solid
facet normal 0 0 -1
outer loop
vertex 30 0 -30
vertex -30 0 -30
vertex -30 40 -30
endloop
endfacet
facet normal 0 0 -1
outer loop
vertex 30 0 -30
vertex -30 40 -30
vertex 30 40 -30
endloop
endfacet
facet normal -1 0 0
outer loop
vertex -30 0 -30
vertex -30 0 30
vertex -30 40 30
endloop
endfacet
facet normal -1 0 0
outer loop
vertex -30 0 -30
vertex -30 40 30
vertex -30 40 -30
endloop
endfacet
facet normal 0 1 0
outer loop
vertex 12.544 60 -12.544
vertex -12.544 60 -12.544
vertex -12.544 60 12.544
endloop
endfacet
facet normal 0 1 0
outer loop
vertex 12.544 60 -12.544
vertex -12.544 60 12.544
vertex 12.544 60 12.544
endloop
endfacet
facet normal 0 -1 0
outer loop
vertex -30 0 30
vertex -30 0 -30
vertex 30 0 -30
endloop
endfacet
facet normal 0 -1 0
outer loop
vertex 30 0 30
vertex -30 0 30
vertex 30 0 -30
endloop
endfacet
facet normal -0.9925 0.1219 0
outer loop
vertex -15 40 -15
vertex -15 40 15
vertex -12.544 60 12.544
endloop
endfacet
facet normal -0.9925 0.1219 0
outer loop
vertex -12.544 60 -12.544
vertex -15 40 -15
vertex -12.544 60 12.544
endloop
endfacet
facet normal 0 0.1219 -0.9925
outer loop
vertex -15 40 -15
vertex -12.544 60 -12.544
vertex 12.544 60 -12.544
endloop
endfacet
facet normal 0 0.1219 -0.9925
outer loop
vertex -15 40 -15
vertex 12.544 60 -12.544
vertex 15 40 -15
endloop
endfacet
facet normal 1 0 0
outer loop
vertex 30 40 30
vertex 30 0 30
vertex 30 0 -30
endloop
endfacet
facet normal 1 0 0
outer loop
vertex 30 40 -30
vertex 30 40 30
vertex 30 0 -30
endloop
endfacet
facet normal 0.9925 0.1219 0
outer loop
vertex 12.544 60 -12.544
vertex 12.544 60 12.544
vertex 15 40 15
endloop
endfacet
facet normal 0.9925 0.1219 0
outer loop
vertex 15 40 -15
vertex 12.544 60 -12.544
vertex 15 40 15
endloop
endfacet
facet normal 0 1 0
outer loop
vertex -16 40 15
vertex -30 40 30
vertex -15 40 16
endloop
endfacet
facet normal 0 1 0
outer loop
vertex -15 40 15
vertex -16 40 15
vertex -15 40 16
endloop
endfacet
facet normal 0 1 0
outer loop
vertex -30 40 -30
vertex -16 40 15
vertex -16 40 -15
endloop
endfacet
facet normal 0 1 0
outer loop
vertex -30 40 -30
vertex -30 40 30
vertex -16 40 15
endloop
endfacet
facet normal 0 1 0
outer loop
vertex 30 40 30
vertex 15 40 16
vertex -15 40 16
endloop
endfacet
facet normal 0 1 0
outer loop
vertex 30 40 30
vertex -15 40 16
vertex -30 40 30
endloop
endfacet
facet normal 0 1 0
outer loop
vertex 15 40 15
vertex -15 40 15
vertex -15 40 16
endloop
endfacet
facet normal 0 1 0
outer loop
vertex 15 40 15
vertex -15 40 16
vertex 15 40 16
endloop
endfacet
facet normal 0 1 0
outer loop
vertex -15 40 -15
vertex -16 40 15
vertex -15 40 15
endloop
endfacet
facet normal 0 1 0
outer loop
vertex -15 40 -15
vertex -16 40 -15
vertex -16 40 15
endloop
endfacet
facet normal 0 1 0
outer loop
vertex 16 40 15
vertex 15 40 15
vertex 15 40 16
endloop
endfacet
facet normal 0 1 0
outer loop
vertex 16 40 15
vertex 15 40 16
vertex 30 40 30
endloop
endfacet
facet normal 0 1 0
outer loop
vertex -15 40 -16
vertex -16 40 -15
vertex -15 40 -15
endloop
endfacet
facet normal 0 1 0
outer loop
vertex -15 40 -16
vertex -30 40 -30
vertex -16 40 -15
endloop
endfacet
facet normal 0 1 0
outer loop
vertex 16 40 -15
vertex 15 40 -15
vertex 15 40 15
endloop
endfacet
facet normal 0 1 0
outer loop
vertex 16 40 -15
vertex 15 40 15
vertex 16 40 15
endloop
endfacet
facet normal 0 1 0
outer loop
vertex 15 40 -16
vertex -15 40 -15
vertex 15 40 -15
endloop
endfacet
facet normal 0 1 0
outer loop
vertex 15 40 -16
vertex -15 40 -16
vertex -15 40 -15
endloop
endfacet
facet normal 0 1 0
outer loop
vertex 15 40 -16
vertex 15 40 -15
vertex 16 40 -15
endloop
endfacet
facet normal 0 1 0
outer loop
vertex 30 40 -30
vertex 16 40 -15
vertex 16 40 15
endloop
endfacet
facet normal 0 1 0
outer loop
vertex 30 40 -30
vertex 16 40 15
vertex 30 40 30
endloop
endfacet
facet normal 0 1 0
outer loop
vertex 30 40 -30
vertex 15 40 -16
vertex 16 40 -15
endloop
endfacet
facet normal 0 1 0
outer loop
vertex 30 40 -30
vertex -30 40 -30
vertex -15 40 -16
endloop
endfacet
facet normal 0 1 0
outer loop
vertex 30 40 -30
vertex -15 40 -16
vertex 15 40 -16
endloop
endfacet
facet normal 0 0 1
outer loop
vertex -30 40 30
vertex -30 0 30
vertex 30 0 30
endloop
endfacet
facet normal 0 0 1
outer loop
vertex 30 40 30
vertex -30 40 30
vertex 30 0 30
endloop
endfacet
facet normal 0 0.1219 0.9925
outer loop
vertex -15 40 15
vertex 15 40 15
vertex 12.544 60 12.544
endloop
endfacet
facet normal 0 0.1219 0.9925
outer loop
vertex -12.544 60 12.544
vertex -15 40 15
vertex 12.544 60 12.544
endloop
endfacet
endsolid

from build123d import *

# Parameters (mm, degrees)
SKETCH1_W           = 60
SKETCH1_H           = 60
BOSS_EXTRUDE1_DEPTH = 40
SKETCH2_W           = 30
SKETCH2_H           = 30
BOSS_EXTRUDE2_DEPTH = 20
BOSS_EXTRUDE2_TAPER = 5
DRAFT1_START        = -16
DRAFT1_DEPTH        = 32
DRAFT1_2_DEPTH      = 32


with BuildPart() as part:
    # Sketch1 → Boss-Extrude1 (new body)
    with BuildSketch(Plane(origin=(0, 0, 0), x_dir=(1, 0, 0), z_dir=(0, 1, 0))):
        Rectangle(SKETCH1_W, SKETCH1_H)
    extrude(amount=BOSS_EXTRUDE1_DEPTH)

    # Sketch2 → Boss-Extrude2 (add)
    with BuildSketch(Plane(origin=(0, 40, 0), x_dir=(1, 0, 0), z_dir=(0, 1, 0))):
        Rectangle(SKETCH2_W, SKETCH2_H)
    extrude(amount=BOSS_EXTRUDE2_DEPTH, taper=BOSS_EXTRUDE2_TAPER)

    # Draft1: read off the stored shape, not the designer's step
    # Draft1 outline → Draft1 (cut)
    with BuildSketch(Plane.XY.offset(DRAFT1_START)):
        Polygon((-15, 40), (-12.544308782, 60), (-13.250226729, 60), align=None)
        Polygon((12.544308782, 60), (15, 40), (13.250226729, 60), align=None)
    extrude(amount=DRAFT1_DEPTH, mode=Mode.SUBTRACT)

    # Draft1 2 outline → Draft1 2 (cut)
    with BuildSketch(Plane.YZ.offset(DRAFT1_START)):
        Polygon((60, -12.544308782), (40, -15), (60, -13.250226729), align=None)
        Polygon((60, 13.250226729), (40, 15), (60, 12.544308782), align=None)
    extrude(amount=DRAFT1_2_DEPTH, mode=Mode.SUBTRACT)


solid = part.part
